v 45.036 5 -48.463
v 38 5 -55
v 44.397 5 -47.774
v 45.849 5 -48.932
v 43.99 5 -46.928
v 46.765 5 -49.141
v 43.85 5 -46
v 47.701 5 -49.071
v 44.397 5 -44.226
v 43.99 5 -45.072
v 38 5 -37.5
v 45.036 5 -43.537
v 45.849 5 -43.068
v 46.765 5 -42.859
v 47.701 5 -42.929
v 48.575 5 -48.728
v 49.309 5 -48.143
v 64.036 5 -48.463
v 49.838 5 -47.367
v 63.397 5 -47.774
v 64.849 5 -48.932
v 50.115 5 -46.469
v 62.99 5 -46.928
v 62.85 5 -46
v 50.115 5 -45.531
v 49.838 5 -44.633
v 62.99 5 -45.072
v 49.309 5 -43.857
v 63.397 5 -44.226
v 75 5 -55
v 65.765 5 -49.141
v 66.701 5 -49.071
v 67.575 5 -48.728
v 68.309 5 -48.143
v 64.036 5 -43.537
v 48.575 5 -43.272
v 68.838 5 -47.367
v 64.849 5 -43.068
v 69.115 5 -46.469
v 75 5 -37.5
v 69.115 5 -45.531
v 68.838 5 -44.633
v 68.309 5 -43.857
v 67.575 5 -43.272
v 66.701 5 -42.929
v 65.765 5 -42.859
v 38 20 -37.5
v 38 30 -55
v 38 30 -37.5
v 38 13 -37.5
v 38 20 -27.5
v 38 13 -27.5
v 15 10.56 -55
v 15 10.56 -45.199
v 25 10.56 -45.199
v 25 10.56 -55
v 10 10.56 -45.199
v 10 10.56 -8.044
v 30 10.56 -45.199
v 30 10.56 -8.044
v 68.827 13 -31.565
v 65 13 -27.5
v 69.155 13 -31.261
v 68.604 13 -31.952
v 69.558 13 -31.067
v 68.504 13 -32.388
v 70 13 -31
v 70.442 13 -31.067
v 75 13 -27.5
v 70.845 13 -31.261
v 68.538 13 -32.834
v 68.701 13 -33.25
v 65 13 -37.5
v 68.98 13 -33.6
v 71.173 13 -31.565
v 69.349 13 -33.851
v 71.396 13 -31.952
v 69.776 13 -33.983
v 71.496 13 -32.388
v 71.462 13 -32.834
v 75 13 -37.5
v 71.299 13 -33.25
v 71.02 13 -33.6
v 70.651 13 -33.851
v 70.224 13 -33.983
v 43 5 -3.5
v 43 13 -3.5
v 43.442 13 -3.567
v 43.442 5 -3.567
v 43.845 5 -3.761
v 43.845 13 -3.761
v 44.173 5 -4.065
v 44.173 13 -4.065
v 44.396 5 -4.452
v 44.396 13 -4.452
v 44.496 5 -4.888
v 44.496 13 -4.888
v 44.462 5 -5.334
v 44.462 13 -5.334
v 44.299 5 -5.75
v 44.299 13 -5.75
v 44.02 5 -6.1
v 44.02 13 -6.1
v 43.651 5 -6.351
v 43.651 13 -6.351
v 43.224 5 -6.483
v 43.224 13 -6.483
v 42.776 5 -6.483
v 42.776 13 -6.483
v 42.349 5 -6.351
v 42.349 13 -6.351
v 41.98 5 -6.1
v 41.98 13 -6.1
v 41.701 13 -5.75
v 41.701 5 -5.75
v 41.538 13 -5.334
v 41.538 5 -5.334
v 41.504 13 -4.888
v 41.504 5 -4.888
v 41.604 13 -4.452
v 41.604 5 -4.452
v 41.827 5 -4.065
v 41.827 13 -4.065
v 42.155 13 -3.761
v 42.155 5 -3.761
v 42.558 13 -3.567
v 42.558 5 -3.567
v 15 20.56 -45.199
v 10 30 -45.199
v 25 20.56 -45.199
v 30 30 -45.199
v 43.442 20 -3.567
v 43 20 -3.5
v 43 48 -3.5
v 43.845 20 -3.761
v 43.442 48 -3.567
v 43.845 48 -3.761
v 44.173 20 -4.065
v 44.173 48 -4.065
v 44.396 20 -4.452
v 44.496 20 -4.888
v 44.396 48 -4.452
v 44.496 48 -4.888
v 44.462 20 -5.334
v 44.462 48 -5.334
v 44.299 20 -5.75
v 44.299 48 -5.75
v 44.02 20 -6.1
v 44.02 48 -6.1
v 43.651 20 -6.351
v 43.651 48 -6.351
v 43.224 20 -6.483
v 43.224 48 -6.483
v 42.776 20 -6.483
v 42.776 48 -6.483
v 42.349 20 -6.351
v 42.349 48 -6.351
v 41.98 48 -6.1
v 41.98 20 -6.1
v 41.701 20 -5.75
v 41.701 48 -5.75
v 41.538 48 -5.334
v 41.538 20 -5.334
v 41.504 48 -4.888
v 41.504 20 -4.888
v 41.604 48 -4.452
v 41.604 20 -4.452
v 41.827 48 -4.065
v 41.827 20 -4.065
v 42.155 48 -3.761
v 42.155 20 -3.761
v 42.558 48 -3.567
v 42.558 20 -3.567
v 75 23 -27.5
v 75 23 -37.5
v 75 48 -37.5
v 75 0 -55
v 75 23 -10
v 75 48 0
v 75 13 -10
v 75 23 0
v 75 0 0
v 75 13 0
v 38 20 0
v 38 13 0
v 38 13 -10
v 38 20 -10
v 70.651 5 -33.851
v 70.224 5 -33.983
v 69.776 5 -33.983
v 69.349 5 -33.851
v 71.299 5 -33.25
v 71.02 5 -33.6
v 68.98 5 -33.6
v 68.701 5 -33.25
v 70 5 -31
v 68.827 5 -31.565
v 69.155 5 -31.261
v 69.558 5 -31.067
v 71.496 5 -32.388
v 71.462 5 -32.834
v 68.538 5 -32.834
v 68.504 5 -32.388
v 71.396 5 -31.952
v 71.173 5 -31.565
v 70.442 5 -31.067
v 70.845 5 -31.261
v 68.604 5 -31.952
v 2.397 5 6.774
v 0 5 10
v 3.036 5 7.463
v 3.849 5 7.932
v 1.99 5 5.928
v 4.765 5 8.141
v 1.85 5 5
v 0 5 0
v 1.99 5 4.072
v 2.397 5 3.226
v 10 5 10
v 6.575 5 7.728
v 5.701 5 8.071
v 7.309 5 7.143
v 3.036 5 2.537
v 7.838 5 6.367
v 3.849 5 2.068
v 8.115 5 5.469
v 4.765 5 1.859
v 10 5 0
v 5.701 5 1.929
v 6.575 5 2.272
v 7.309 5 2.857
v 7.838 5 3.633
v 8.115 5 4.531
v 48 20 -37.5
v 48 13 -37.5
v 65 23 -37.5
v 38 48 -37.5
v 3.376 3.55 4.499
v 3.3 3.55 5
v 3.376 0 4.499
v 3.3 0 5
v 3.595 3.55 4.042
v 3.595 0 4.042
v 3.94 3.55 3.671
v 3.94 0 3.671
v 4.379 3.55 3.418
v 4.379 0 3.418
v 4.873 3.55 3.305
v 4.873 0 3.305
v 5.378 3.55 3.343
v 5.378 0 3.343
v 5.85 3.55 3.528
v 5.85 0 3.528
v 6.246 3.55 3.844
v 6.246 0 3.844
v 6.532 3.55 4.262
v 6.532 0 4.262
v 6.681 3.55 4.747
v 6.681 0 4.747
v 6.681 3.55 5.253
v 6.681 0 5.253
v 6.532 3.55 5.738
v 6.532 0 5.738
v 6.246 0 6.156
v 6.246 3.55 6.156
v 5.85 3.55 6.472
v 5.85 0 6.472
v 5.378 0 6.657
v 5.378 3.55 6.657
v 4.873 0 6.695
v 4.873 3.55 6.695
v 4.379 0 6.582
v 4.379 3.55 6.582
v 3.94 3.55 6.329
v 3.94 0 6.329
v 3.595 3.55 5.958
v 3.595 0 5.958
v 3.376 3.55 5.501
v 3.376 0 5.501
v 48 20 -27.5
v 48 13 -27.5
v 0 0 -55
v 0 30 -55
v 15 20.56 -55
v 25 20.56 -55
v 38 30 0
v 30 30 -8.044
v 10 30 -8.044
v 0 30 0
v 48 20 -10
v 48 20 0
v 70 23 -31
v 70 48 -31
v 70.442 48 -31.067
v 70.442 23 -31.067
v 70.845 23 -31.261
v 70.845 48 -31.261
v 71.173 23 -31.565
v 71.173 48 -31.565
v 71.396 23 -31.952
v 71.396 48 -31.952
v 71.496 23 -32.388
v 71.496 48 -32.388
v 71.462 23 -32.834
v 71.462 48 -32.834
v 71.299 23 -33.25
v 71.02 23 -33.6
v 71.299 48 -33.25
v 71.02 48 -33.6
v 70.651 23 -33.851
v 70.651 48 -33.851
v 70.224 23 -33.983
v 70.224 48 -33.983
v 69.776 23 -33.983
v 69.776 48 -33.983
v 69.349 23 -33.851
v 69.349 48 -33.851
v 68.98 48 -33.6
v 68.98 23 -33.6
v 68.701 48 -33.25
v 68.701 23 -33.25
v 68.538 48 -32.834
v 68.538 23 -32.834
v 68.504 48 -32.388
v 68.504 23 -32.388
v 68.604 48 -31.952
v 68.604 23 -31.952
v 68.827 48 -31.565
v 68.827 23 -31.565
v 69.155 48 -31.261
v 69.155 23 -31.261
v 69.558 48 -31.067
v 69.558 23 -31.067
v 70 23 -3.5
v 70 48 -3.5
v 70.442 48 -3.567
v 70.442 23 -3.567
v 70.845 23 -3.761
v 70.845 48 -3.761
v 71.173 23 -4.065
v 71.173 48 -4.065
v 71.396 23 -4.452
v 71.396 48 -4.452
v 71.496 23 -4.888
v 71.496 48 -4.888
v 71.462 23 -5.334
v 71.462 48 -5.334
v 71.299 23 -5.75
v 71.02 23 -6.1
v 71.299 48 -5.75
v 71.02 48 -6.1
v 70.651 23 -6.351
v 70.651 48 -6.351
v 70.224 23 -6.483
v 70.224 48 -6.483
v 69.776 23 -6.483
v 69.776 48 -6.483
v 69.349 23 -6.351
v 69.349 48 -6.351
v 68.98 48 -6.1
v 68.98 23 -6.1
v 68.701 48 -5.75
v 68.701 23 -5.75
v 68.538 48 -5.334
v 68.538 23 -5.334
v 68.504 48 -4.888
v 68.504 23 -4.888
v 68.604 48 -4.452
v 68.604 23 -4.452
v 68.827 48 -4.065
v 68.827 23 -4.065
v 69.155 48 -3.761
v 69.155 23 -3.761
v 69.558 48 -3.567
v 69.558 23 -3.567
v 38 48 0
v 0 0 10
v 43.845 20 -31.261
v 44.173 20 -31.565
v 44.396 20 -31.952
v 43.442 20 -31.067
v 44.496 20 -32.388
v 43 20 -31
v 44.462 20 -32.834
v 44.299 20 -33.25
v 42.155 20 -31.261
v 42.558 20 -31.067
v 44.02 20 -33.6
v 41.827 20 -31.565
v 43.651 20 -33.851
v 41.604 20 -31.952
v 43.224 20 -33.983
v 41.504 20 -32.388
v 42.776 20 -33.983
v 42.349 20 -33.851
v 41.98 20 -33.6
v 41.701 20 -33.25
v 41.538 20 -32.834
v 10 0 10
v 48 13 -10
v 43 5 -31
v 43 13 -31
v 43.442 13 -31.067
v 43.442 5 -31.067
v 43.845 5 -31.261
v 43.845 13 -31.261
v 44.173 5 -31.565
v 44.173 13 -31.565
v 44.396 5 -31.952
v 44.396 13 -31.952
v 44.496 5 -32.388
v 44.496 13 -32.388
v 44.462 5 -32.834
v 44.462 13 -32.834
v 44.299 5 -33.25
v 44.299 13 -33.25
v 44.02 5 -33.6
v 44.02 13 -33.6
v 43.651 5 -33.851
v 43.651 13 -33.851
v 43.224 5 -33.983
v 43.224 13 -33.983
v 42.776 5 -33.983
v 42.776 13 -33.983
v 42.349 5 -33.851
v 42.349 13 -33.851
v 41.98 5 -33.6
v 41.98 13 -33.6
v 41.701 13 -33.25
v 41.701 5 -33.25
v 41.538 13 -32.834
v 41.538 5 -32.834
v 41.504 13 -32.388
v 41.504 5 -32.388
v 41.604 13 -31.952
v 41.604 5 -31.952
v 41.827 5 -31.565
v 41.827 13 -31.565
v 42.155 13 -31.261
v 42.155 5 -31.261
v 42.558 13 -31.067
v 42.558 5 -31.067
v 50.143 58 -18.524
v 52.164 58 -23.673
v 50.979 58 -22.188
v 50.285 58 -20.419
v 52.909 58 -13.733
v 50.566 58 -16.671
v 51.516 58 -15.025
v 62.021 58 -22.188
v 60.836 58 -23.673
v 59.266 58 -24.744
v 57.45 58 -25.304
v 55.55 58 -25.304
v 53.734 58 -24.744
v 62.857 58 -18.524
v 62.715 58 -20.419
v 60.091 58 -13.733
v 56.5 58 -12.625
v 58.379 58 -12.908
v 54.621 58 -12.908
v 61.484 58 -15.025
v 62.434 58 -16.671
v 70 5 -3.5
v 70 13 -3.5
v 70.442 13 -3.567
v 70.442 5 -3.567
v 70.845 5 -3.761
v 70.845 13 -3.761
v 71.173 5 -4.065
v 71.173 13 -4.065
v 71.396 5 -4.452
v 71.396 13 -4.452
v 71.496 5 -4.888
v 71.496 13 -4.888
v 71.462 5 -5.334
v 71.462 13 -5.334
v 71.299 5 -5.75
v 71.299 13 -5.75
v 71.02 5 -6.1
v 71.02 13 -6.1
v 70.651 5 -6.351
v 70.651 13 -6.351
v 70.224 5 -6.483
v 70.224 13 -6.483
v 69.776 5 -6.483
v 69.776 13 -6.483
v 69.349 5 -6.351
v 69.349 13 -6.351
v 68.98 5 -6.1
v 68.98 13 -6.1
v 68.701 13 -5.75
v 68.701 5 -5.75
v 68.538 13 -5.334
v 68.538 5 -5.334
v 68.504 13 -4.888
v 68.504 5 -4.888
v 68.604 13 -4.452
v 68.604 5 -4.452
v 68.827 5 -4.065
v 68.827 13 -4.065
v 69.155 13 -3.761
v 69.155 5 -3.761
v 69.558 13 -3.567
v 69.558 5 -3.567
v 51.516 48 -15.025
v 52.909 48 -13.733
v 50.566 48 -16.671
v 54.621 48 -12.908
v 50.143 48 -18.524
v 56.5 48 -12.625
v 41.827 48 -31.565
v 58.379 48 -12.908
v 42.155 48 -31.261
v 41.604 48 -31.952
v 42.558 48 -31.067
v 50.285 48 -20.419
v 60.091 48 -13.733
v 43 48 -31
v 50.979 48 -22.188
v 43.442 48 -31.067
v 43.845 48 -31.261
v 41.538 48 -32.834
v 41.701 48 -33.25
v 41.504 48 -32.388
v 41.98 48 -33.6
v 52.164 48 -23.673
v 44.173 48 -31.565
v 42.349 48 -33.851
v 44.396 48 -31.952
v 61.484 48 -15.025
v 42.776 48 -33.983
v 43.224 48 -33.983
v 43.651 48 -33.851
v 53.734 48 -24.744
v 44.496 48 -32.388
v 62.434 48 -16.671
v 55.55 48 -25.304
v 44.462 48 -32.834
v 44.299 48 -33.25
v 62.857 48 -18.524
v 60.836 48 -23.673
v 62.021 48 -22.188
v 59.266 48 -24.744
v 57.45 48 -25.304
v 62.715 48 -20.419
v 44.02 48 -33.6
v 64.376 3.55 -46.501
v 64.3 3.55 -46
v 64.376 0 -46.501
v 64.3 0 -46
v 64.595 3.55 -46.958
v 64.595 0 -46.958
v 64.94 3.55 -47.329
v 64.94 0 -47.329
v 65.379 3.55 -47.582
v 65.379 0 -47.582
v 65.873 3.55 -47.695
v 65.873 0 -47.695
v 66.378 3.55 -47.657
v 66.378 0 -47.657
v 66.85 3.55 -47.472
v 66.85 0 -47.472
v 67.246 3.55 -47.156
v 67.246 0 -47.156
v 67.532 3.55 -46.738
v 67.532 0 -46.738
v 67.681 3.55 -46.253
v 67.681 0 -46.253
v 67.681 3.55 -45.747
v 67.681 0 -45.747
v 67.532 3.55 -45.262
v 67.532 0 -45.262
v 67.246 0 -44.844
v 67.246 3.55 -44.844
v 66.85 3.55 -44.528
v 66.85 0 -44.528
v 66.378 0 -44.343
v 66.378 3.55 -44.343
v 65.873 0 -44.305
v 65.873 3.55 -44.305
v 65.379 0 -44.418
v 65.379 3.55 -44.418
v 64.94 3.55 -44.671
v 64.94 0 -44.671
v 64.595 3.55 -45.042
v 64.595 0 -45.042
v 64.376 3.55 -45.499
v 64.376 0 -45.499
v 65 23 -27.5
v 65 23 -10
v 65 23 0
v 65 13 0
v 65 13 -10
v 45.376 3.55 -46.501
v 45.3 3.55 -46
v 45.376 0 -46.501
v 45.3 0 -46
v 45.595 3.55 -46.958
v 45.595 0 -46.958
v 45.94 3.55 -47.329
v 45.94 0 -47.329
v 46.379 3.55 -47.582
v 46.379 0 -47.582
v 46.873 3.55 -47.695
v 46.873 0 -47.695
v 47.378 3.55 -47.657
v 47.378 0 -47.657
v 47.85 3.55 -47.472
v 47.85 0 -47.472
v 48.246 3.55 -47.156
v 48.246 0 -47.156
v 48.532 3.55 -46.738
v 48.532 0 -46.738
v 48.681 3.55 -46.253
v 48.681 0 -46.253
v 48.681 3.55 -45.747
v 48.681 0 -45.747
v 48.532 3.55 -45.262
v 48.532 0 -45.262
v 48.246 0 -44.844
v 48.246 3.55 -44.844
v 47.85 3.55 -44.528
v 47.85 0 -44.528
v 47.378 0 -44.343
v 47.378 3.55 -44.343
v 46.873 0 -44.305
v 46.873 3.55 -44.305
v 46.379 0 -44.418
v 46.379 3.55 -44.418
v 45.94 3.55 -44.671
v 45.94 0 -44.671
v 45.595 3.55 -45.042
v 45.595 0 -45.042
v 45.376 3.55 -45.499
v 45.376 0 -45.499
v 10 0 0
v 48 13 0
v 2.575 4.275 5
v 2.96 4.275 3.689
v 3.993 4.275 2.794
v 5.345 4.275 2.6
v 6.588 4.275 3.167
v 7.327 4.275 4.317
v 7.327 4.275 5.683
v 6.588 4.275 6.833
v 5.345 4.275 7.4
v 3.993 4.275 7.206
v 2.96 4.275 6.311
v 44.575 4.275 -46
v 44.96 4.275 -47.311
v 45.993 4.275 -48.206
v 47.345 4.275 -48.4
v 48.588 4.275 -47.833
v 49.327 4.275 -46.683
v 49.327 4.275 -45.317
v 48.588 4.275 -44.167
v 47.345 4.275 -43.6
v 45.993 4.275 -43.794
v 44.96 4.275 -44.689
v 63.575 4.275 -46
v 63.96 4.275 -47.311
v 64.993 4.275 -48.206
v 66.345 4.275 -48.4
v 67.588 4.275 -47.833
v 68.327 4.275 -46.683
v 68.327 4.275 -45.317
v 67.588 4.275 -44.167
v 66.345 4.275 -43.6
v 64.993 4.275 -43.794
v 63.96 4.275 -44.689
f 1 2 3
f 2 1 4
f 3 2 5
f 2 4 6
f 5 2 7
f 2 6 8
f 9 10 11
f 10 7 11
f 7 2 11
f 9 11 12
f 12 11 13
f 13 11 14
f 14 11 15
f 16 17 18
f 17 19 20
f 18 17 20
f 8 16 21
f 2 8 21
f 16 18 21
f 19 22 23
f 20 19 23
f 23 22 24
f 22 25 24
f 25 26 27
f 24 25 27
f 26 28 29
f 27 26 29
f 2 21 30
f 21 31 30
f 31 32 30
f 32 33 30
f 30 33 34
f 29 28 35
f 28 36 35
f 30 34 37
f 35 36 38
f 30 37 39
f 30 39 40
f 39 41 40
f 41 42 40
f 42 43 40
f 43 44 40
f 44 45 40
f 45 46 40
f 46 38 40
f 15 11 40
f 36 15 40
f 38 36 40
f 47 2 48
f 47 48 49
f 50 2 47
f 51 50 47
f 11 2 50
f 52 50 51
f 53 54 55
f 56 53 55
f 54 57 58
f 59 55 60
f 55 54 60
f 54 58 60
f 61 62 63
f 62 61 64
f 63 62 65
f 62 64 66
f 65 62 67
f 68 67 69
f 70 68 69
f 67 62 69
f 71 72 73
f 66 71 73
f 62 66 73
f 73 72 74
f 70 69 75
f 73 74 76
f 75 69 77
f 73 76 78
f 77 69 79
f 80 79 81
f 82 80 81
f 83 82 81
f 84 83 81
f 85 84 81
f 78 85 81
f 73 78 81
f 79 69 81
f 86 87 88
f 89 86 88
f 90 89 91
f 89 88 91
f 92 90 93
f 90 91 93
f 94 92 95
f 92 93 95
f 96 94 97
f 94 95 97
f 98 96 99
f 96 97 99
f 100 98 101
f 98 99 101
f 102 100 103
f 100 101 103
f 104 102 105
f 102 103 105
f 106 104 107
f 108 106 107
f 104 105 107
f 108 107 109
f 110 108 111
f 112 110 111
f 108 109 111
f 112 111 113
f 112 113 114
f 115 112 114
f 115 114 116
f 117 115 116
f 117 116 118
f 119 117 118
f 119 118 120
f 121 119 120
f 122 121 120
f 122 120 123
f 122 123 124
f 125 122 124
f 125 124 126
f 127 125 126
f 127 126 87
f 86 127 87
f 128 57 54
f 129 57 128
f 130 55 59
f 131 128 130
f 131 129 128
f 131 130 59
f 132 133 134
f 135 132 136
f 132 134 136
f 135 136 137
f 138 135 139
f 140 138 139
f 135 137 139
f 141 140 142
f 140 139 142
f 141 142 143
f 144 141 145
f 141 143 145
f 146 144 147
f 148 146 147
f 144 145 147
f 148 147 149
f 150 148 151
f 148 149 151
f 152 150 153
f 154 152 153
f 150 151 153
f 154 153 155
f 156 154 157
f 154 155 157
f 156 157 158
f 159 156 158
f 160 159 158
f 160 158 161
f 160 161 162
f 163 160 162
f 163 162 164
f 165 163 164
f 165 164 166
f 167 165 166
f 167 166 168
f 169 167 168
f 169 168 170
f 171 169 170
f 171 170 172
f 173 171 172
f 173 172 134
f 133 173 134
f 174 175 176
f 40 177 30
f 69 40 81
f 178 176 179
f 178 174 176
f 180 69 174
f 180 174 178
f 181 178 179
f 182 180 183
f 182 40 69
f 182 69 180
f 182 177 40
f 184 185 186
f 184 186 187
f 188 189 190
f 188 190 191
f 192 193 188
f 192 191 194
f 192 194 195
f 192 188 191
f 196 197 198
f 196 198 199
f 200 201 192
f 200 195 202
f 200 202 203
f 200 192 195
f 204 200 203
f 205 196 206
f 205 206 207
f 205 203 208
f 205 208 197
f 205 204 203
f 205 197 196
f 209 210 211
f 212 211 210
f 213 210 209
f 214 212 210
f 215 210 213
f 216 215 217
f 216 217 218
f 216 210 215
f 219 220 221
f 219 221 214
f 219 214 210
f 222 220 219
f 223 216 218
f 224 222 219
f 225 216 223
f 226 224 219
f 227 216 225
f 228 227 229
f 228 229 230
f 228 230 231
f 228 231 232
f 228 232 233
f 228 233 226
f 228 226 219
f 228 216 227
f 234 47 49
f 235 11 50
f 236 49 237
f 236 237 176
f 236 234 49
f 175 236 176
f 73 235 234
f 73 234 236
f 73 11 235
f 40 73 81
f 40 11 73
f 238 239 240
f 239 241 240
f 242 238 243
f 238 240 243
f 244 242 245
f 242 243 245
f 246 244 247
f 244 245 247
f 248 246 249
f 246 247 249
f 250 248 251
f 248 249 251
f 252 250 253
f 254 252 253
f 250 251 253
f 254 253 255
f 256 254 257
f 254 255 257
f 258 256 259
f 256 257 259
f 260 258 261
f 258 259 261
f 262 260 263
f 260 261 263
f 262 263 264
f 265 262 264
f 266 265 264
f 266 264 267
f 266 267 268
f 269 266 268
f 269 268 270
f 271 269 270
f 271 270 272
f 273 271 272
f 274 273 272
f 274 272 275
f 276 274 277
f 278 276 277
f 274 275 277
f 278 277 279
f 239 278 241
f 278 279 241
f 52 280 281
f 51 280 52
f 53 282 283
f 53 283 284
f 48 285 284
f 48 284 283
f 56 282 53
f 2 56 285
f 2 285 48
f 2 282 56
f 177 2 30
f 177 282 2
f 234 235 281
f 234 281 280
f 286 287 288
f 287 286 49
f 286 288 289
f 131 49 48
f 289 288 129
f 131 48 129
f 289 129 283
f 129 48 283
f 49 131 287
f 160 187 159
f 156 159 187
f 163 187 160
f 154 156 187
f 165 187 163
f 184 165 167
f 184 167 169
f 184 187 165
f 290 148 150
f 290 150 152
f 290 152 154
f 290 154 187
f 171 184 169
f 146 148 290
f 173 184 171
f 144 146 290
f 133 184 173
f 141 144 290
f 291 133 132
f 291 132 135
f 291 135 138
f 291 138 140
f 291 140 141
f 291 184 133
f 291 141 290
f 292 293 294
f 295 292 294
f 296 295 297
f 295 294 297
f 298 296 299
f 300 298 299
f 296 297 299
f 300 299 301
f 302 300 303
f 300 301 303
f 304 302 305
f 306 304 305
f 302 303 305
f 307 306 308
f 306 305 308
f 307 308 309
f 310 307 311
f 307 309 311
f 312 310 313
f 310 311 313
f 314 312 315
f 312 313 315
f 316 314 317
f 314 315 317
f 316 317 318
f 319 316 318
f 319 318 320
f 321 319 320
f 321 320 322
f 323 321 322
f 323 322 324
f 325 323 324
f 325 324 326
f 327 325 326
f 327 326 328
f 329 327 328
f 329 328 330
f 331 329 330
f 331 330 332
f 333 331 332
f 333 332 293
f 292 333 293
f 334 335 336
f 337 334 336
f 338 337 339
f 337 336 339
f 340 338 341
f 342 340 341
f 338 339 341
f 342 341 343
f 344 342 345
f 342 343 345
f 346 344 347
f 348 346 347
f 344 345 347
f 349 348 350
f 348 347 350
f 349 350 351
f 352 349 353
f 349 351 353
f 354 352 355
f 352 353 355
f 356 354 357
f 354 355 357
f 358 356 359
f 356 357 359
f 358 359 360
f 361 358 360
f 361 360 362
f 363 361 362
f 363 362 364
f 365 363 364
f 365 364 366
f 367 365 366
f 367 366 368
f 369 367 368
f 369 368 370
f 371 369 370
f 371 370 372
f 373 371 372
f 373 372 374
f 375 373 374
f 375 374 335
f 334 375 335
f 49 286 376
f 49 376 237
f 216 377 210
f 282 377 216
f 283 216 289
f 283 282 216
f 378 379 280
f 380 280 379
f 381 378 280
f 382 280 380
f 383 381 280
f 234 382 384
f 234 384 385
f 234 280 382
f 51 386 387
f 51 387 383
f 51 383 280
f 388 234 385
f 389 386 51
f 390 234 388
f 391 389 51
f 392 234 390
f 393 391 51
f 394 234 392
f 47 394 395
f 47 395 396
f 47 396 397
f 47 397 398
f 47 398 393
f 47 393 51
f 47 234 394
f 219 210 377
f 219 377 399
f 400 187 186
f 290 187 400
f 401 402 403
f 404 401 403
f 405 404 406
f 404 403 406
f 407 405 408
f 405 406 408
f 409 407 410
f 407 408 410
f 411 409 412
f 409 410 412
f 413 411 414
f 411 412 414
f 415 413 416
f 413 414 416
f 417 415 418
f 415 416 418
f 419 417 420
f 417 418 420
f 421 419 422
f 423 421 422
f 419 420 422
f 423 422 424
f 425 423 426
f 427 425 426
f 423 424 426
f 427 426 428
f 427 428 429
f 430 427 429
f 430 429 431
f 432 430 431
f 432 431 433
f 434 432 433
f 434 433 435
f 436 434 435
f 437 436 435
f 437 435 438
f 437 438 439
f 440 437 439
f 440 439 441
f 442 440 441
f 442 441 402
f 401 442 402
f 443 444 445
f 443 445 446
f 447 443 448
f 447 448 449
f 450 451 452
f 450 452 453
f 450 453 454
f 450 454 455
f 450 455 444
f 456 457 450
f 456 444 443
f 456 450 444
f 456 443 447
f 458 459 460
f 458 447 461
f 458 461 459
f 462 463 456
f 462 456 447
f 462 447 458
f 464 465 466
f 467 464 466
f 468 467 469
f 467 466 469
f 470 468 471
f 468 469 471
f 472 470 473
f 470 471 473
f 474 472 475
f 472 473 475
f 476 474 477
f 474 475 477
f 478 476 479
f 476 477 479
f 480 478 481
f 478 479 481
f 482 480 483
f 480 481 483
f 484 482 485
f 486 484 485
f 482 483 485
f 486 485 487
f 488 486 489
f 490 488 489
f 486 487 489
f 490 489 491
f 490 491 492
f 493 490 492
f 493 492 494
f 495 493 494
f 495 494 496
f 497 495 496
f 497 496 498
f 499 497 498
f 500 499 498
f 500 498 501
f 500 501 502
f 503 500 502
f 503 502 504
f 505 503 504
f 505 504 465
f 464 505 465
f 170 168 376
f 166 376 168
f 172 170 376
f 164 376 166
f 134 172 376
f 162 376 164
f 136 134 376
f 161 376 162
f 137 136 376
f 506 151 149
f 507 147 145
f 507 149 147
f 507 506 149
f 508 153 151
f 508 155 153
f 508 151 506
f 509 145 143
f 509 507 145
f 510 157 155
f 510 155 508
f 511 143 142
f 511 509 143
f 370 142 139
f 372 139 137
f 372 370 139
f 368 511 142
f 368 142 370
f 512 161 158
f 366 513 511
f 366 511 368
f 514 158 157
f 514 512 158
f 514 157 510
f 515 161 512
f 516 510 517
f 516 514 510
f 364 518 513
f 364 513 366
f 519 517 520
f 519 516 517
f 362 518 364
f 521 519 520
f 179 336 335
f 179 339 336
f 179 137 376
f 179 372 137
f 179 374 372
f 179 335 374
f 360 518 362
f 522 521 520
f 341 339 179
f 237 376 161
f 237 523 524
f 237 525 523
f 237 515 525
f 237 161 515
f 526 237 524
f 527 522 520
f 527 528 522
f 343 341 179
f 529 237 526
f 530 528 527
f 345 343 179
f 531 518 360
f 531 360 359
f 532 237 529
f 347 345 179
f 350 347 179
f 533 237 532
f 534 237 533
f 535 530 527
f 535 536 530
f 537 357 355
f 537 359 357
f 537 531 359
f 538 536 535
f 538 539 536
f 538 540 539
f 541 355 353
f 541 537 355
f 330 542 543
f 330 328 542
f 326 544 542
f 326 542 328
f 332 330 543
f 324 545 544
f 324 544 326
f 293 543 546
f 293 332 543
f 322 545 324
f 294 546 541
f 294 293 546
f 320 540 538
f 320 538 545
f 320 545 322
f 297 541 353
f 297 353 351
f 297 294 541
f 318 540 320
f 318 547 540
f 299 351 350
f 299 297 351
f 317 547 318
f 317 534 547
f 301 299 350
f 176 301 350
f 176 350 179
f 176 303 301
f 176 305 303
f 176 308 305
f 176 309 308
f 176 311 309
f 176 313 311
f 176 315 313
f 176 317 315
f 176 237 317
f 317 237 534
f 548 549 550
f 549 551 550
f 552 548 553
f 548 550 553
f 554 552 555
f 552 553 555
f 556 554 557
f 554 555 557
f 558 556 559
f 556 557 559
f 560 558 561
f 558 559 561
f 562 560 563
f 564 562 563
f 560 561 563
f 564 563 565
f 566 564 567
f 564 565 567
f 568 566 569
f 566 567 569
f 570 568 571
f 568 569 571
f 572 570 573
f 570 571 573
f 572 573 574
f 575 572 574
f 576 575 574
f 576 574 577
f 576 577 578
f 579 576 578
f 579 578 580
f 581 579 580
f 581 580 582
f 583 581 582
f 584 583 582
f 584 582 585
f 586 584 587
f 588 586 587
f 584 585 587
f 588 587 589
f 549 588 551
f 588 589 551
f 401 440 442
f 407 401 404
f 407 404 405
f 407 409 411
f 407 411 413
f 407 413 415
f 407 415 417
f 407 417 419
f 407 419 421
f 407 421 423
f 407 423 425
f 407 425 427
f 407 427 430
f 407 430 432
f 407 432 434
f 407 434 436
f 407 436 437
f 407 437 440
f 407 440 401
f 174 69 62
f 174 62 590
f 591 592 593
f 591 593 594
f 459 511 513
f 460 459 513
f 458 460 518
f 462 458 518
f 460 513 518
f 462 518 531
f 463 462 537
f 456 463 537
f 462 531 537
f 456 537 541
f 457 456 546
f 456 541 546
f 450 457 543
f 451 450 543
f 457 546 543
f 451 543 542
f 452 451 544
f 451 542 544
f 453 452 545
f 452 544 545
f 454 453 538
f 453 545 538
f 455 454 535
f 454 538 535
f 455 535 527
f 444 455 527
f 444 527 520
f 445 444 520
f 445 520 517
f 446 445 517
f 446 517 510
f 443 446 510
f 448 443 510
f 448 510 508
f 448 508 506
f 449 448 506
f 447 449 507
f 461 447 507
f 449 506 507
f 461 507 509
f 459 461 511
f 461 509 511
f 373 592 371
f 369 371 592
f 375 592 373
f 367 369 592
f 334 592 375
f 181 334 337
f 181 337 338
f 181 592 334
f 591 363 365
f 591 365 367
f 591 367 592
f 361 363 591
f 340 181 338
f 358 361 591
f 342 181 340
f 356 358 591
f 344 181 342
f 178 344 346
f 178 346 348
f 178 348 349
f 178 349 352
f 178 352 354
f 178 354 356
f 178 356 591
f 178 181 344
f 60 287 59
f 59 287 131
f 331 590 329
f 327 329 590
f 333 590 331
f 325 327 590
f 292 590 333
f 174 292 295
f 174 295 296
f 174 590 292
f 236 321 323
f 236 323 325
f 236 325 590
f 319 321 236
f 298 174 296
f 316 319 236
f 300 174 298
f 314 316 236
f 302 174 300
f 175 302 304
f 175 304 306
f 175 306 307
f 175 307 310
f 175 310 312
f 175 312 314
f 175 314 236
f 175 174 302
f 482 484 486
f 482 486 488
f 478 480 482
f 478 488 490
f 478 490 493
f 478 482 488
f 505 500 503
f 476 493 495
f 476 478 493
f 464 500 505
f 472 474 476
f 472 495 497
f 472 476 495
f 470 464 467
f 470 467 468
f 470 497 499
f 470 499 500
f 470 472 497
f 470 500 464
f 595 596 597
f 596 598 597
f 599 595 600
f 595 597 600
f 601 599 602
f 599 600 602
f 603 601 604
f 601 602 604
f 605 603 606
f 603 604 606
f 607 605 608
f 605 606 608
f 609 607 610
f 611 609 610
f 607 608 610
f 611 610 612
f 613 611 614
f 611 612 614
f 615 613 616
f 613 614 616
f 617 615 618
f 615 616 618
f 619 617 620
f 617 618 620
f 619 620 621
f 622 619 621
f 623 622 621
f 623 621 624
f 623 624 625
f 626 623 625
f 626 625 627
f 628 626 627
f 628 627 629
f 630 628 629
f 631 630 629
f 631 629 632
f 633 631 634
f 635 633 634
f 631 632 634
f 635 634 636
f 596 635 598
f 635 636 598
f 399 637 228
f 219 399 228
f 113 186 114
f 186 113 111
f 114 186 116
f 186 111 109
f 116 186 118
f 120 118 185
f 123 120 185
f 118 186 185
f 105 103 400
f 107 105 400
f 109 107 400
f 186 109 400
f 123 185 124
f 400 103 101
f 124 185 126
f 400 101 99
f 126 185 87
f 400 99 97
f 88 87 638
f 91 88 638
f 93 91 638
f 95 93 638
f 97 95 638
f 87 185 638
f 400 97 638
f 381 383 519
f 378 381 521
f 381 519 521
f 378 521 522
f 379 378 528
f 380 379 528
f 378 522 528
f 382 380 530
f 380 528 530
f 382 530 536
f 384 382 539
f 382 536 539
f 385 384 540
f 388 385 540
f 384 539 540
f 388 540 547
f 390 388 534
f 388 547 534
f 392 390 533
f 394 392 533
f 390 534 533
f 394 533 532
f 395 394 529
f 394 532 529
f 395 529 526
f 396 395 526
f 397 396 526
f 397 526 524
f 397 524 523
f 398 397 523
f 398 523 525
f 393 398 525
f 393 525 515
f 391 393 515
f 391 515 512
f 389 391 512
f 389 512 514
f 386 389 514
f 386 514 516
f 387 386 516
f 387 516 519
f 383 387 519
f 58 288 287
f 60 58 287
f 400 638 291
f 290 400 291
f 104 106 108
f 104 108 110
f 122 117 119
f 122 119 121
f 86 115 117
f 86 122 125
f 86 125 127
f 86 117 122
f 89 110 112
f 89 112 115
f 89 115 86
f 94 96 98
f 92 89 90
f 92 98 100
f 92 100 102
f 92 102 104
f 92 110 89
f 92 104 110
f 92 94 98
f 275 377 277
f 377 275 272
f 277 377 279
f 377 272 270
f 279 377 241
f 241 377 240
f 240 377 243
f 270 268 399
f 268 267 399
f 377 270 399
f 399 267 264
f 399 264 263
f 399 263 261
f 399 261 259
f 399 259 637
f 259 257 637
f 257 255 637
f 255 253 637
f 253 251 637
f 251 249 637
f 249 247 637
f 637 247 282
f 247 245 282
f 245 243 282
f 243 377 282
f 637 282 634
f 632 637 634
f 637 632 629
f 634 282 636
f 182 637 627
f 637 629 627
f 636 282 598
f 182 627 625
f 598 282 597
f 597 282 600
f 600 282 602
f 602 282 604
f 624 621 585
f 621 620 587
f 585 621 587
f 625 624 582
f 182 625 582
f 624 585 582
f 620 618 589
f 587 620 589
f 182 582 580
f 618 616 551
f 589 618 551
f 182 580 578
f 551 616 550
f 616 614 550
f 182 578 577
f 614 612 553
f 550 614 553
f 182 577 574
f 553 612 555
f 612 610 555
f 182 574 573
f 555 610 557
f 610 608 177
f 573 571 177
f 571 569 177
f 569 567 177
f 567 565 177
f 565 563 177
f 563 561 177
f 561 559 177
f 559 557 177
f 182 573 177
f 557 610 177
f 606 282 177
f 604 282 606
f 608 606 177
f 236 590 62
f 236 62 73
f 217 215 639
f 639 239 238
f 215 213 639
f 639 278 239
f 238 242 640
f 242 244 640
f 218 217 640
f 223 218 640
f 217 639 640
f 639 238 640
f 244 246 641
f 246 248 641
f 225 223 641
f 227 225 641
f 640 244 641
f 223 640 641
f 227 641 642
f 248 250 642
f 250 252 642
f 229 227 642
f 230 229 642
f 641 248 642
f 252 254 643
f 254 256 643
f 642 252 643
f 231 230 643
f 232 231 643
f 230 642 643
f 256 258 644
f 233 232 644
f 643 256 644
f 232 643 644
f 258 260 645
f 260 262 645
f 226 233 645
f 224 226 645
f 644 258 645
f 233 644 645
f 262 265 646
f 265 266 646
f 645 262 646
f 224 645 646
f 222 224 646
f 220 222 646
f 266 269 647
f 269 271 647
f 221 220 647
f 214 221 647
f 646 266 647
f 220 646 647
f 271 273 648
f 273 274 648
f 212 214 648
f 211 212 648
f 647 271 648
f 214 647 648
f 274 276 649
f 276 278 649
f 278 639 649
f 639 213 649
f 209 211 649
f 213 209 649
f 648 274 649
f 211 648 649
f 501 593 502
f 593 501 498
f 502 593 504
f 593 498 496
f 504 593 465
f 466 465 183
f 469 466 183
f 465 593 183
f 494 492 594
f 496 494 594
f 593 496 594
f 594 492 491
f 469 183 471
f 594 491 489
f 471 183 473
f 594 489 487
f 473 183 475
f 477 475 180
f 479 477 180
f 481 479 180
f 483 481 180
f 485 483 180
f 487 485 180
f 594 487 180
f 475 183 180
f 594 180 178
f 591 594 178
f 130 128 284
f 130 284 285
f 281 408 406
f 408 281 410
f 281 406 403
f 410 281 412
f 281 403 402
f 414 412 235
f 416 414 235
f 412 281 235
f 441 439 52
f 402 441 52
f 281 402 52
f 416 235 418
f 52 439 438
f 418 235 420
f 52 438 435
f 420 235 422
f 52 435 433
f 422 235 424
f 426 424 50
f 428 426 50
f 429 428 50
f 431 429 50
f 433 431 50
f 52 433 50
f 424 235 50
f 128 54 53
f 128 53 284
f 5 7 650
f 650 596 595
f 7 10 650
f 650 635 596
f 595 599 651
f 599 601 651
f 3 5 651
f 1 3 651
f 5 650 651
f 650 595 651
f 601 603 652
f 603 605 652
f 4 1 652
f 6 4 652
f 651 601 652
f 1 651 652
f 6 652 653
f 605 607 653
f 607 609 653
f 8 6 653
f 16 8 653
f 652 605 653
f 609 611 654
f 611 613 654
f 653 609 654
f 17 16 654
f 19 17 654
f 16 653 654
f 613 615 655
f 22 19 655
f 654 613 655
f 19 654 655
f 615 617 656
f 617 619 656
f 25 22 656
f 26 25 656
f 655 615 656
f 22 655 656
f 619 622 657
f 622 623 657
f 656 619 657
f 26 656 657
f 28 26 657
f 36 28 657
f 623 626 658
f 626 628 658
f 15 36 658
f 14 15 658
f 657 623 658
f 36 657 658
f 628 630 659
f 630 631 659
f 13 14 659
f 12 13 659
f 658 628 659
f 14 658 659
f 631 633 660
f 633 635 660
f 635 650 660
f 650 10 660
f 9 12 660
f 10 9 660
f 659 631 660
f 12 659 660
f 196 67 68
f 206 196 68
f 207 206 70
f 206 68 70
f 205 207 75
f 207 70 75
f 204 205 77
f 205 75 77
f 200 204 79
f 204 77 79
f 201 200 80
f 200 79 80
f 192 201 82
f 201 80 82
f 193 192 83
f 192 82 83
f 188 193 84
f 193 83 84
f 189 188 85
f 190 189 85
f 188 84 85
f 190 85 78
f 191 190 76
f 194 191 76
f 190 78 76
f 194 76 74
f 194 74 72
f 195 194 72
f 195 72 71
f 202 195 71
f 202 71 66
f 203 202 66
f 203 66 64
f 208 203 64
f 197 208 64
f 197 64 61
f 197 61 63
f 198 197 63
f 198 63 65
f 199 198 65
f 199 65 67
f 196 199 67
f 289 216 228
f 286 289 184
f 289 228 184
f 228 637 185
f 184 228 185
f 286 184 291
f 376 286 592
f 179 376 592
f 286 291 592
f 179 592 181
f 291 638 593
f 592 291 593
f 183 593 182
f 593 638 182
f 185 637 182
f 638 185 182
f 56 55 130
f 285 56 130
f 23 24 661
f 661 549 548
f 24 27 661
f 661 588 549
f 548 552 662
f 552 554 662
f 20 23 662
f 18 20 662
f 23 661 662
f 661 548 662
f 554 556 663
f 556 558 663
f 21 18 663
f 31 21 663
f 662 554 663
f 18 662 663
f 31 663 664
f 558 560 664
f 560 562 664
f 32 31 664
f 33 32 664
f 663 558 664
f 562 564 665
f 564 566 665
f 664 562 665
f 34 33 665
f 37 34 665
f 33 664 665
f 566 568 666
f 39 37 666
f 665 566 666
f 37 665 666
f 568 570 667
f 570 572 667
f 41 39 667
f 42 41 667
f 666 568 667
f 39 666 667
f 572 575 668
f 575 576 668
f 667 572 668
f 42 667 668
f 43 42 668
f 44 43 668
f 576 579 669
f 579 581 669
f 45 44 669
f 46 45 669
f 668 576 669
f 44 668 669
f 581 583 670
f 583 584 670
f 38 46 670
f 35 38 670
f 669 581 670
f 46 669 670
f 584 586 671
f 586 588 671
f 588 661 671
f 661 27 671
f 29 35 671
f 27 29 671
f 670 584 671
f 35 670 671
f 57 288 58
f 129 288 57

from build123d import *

# Parameters (mm, degrees)
BOSS_EXTRU_1_DEPTH                                = 30
ESQUISSE6_W                                       = 37
ESQUISSE6_H                                       = 37.5
BOSS_EXTRU_4_DEPTH                                = 18
ESQUISSE7_R                                       = 6.375
BOSS_EXTRU_5_DEPTH                                = 10
ESQUISSE8_R                                       = 1.5
ENL_V_MAT_EXTRU_1_DEPTH                           = 43
ESQUISSE9_W                                       = 10
ESQUISSE9_H                                       = 10
ENL_V_MAT_EXTRU_2_DEPTH                           = 10
ESQUISSE10_W                                      = 10
ESQUISSE10_H                                      = 7
ENL_V_MAT_EXTRU_5_DEPTH                           = 10
ESQUISSE11_W                                      = 10
ESQUISSE11_H                                      = 7
ENL_V_MAT_EXTRU_6_DEPTH                           = 10
ESQUISSE12_W                                      = 20
ESQUISSE12_H                                      = 37.154688963
ENL_V_MAT_EXTRU_7_DEPTH                           = 19.44
ESQUISSE13_W                                      = 10
ESQUISSE13_H                                      = 10
ENL_V_MAT_EXTRU_8_DEPTH                           = 9.801191536
ESQUISSE14_W                                      = 37
ESQUISSE14_H                                      = 17.5
BOSS_EXTRU_6_DEPTH                                = 5
ESQUISSE20_W                                      = 10
ESQUISSE20_H                                      = 5
BOSS_EXTRU_8_DEPTH                                = 10
FRAISAGE_POUR_VIS_T_TE_FRAIS_E_BOMB_E_D           = 3.4
FRAISAGE_POUR_VIS_T_TE_FRAIS_E_BOMB_E_DEPTH       = 5
FRAISAGE_POUR_VIS_T_TE_FRAIS_E_BOMB_E_CSINK_D     = 6.3
FRAISAGE_POUR_VIS_T_TE_FRAIS_E_BOMB_E_CSINK_ANGLE = 90
FRAISAGE_POUR_VIS_T_TE_FRAIS_E_BOMB_E_TIP         = 1.021463052


with BuildPart() as part:
    # Esquisse3 → Boss.-Extru.1 (new body)
    with BuildSketch(Plane(origin=(0, 0, 0), x_dir=(1, 0, 0), z_dir=(0, 1, 0))):
        Polygon((0, 0), (0, 55), (38, 55), (38, 37.5), (75, 37.5), (75, 0), align=None)
    extrude(amount=BOSS_EXTRU_1_DEPTH)

    # Esquisse6 → Boss.-Extru.4 (add)
    with BuildSketch(Plane(origin=(0, 30, 0), x_dir=(1, 0, 0), z_dir=(0, 1, 0))):
        with Locations((56.5, 18.75)):
            Rectangle(ESQUISSE6_W, ESQUISSE6_H)
    extrude(amount=BOSS_EXTRU_4_DEPTH)

    # Esquisse7 → Boss.-Extru.5 (add)
    with BuildSketch(Plane(origin=(0, 48, 0), x_dir=(1, 0, 0), z_dir=(0, 1, 0))):
        with Locations(Location((56.5, 19, 0), (0, 0, 270))):
            Circle(ESQUISSE7_R)
    extrude(amount=BOSS_EXTRU_5_DEPTH)

    # Esquisse8 → Enlèv. mat.-Extru.1 (cut)
    with BuildSketch(Plane(origin=(0, 48, 0), x_dir=(1, 0, 0), z_dir=(0, 1, 0))):
        with Locations(Location((43, 32.5, 0), (0, 0, 270))):
            Circle(ESQUISSE8_R)
        with Locations(Location((70, 32.5, 0), (0, 0, 270))):
            Circle(ESQUISSE8_R)
        with Locations(Location((70, 5, 0), (0, 0, 270))):
            Circle(ESQUISSE8_R)
        with Locations(Location((43, 5, 0), (0, 0, 270))):
            Circle(ESQUISSE8_R)
    extrude(amount=-ENL_V_MAT_EXTRU_1_DEPTH, mode=Mode.SUBTRACT)

    # Esquisse9 → Enlèv. mat.-Extru.2 (cut)
    with BuildSketch(Plane(origin=(75, 0, 0), x_dir=(0, 0, -1), z_dir=(1, 0, 0))):
        with Locations((5, 18)):
            Rectangle(ESQUISSE9_W, ESQUISSE9_H)
        with Locations((32.5, 18)):
            Rectangle(ESQUISSE9_W, ESQUISSE9_H)
    extrude(amount=-ENL_V_MAT_EXTRU_2_DEPTH, mode=Mode.SUBTRACT)

    # Esquisse10 → Enlèv. mat.-Extru.5 (cut)
    with BuildSketch(Plane(origin=(0, 0, -37.5), x_dir=(-1, 0, 0), z_dir=(0, 0, -1))):
        with Locations((-43, 16.5)):
            Rectangle(ESQUISSE10_W, ESQUISSE10_H)
    extrude(amount=-ENL_V_MAT_EXTRU_5_DEPTH, mode=Mode.SUBTRACT)

    # Esquisse11 → Enlèv. mat.-Extru.6 (cut)
    with BuildSketch(Plane.XY):
        with Locations((43, 16.5)):
            Rectangle(ESQUISSE11_W, ESQUISSE11_H)
    extrude(amount=-ENL_V_MAT_EXTRU_6_DEPTH, mode=Mode.SUBTRACT)

    # Esquisse12 → Enlèv. mat.-Extru.7 (cut)
    with BuildSketch(Plane(origin=(0, 30, 0), x_dir=(1, 0, 0), z_dir=(0, 1, 0))):
        with Locations((20, 26.621463983)):
            Rectangle(ESQUISSE12_W, ESQUISSE12_H)
    extrude(amount=-ENL_V_MAT_EXTRU_7_DEPTH, mode=Mode.SUBTRACT)

    # Esquisse13 → Enlèv. mat.-Extru.8 (cut)
    with BuildSketch(Plane.XY.offset(-45.198808464)):
        with Locations((20, 15.56)):
            Rectangle(ESQUISSE13_W, ESQUISSE13_H)
    extrude(amount=-ENL_V_MAT_EXTRU_8_DEPTH, mode=Mode.SUBTRACT)

    # Esquisse14 → Boss.-Extru.6 (add)
    with BuildSketch(Plane.XZ):
        with Locations((56.5, -46.25)):
            Rectangle(ESQUISSE14_W, ESQUISSE14_H)
    extrude(amount=-BOSS_EXTRU_6_DEPTH)

    # Esquisse20 → Boss.-Extru.8 (add)
    with BuildSketch(Plane.XY):
        with Locations((5, 2.5)):
            Rectangle(ESQUISSE20_W, ESQUISSE20_H)
    extrude(amount=BOSS_EXTRU_8_DEPTH)

    # Fraisage pour vis à tête fraisée bombée M32
    with Locations(Plane(origin=(0, 5, 0), x_dir=(1, 0, 0), z_dir=(0, 1, 0))):
        with Locations((5, -5), (47, 46), (66, 46)):
            CounterSinkHole(FRAISAGE_POUR_VIS_T_TE_FRAIS_E_BOMB_E_D / 2, FRAISAGE_POUR_VIS_T_TE_FRAIS_E_BOMB_E_CSINK_D / 2, depth=FRAISAGE_POUR_VIS_T_TE_FRAIS_E_BOMB_E_DEPTH, counter_sink_angle=FRAISAGE_POUR_VIS_T_TE_FRAIS_E_BOMB_E_CSINK_ANGLE)
            with Locations((0, 0, -(FRAISAGE_POUR_VIS_T_TE_FRAIS_E_BOMB_E_DEPTH + FRAISAGE_POUR_VIS_T_TE_FRAIS_E_BOMB_E_TIP / 2))):  # 118° drill point
                Cone(0, FRAISAGE_POUR_VIS_T_TE_FRAIS_E_BOMB_E_D / 2, FRAISAGE_POUR_VIS_T_TE_FRAIS_E_BOMB_E_TIP, mode=Mode.SUBTRACT)


solid = part.part
